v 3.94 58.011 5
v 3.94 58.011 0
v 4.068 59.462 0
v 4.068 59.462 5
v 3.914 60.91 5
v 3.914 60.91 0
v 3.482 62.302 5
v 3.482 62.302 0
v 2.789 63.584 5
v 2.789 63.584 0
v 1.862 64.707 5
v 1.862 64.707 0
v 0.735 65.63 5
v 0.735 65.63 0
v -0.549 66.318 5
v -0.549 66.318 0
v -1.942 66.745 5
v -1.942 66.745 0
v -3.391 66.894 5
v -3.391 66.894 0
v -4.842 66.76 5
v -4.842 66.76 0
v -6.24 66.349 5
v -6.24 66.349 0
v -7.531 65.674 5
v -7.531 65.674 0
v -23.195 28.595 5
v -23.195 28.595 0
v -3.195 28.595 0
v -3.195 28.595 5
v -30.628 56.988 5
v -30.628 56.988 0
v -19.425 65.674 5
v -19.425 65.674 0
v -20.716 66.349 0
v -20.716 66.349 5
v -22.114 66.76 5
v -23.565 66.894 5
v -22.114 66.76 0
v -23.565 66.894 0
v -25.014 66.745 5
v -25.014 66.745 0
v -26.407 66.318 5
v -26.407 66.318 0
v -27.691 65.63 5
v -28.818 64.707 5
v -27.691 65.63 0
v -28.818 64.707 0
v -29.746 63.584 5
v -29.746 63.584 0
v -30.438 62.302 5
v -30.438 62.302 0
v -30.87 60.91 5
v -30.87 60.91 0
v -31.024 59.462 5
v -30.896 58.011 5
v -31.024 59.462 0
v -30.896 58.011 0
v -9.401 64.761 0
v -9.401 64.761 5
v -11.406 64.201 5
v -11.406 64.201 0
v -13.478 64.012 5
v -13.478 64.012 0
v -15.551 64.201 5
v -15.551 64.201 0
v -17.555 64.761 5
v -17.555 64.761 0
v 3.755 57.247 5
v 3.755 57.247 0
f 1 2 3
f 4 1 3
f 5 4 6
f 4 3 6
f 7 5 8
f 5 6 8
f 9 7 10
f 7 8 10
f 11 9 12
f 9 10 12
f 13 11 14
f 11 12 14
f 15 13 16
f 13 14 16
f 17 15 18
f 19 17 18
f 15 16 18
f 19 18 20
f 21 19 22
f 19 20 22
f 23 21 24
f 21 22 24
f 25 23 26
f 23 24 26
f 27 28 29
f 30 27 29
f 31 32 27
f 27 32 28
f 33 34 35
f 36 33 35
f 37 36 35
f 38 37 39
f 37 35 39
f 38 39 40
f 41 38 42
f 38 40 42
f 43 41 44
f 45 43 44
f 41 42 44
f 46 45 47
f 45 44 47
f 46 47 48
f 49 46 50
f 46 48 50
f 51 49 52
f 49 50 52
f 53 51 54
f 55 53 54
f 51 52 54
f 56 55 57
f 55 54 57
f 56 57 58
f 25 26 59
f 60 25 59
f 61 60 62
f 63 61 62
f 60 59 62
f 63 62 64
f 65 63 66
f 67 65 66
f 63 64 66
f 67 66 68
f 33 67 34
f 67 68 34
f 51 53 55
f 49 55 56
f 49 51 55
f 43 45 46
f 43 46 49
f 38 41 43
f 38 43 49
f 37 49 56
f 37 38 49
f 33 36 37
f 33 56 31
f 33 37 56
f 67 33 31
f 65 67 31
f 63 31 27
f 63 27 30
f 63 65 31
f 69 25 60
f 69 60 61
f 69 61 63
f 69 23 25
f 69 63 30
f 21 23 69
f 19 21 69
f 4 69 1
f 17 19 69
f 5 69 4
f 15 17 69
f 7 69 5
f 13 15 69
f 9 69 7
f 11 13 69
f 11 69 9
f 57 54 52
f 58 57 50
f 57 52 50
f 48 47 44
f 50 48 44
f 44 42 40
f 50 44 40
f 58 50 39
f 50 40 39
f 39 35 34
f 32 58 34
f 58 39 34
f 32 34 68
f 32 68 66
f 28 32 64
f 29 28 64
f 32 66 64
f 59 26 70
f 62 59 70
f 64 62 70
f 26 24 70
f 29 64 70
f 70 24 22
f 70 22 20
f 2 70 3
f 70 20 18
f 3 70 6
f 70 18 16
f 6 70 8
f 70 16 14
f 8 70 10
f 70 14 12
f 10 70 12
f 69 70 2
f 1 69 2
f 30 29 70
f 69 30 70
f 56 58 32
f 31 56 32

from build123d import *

# Parameters (mm, degrees)
F1_DEPTH = 5


with BuildPart() as f1:
    # F0 (on Top) → F1 (new body)
    with BuildSketch(Plane.XY):
        with BuildLine():
            ThreePointArc((-7.531189, 65.674413), (-13.478061, 64.012162), (-19.424933, 65.674413))
            ThreePointArc((-19.424933, 65.674413), (-27.691208, 65.630451), (-30.896061, 58.010598))
            Line((-30.896061, 58.010598), (-30.628454, 56.988378))
            Line((-30.628454, 56.988378), (-23.195385, 28.595213))
            Line((-23.195385, 28.595213), (-13.195385, 28.595213))
            Line((-13.195385, 28.595213), (-3.195385, 28.595213))
            Line((-3.195385, 28.595213), (3.75462, 57.24662))
            Line((3.75462, 57.24662), (3.93994, 58.010598))
            ThreePointArc((3.93994, 58.010598), (0.735086, 65.630451), (-7.531189, 65.674413))
        make_face()
    extrude(amount=F1_DEPTH)


solid = f1.part
